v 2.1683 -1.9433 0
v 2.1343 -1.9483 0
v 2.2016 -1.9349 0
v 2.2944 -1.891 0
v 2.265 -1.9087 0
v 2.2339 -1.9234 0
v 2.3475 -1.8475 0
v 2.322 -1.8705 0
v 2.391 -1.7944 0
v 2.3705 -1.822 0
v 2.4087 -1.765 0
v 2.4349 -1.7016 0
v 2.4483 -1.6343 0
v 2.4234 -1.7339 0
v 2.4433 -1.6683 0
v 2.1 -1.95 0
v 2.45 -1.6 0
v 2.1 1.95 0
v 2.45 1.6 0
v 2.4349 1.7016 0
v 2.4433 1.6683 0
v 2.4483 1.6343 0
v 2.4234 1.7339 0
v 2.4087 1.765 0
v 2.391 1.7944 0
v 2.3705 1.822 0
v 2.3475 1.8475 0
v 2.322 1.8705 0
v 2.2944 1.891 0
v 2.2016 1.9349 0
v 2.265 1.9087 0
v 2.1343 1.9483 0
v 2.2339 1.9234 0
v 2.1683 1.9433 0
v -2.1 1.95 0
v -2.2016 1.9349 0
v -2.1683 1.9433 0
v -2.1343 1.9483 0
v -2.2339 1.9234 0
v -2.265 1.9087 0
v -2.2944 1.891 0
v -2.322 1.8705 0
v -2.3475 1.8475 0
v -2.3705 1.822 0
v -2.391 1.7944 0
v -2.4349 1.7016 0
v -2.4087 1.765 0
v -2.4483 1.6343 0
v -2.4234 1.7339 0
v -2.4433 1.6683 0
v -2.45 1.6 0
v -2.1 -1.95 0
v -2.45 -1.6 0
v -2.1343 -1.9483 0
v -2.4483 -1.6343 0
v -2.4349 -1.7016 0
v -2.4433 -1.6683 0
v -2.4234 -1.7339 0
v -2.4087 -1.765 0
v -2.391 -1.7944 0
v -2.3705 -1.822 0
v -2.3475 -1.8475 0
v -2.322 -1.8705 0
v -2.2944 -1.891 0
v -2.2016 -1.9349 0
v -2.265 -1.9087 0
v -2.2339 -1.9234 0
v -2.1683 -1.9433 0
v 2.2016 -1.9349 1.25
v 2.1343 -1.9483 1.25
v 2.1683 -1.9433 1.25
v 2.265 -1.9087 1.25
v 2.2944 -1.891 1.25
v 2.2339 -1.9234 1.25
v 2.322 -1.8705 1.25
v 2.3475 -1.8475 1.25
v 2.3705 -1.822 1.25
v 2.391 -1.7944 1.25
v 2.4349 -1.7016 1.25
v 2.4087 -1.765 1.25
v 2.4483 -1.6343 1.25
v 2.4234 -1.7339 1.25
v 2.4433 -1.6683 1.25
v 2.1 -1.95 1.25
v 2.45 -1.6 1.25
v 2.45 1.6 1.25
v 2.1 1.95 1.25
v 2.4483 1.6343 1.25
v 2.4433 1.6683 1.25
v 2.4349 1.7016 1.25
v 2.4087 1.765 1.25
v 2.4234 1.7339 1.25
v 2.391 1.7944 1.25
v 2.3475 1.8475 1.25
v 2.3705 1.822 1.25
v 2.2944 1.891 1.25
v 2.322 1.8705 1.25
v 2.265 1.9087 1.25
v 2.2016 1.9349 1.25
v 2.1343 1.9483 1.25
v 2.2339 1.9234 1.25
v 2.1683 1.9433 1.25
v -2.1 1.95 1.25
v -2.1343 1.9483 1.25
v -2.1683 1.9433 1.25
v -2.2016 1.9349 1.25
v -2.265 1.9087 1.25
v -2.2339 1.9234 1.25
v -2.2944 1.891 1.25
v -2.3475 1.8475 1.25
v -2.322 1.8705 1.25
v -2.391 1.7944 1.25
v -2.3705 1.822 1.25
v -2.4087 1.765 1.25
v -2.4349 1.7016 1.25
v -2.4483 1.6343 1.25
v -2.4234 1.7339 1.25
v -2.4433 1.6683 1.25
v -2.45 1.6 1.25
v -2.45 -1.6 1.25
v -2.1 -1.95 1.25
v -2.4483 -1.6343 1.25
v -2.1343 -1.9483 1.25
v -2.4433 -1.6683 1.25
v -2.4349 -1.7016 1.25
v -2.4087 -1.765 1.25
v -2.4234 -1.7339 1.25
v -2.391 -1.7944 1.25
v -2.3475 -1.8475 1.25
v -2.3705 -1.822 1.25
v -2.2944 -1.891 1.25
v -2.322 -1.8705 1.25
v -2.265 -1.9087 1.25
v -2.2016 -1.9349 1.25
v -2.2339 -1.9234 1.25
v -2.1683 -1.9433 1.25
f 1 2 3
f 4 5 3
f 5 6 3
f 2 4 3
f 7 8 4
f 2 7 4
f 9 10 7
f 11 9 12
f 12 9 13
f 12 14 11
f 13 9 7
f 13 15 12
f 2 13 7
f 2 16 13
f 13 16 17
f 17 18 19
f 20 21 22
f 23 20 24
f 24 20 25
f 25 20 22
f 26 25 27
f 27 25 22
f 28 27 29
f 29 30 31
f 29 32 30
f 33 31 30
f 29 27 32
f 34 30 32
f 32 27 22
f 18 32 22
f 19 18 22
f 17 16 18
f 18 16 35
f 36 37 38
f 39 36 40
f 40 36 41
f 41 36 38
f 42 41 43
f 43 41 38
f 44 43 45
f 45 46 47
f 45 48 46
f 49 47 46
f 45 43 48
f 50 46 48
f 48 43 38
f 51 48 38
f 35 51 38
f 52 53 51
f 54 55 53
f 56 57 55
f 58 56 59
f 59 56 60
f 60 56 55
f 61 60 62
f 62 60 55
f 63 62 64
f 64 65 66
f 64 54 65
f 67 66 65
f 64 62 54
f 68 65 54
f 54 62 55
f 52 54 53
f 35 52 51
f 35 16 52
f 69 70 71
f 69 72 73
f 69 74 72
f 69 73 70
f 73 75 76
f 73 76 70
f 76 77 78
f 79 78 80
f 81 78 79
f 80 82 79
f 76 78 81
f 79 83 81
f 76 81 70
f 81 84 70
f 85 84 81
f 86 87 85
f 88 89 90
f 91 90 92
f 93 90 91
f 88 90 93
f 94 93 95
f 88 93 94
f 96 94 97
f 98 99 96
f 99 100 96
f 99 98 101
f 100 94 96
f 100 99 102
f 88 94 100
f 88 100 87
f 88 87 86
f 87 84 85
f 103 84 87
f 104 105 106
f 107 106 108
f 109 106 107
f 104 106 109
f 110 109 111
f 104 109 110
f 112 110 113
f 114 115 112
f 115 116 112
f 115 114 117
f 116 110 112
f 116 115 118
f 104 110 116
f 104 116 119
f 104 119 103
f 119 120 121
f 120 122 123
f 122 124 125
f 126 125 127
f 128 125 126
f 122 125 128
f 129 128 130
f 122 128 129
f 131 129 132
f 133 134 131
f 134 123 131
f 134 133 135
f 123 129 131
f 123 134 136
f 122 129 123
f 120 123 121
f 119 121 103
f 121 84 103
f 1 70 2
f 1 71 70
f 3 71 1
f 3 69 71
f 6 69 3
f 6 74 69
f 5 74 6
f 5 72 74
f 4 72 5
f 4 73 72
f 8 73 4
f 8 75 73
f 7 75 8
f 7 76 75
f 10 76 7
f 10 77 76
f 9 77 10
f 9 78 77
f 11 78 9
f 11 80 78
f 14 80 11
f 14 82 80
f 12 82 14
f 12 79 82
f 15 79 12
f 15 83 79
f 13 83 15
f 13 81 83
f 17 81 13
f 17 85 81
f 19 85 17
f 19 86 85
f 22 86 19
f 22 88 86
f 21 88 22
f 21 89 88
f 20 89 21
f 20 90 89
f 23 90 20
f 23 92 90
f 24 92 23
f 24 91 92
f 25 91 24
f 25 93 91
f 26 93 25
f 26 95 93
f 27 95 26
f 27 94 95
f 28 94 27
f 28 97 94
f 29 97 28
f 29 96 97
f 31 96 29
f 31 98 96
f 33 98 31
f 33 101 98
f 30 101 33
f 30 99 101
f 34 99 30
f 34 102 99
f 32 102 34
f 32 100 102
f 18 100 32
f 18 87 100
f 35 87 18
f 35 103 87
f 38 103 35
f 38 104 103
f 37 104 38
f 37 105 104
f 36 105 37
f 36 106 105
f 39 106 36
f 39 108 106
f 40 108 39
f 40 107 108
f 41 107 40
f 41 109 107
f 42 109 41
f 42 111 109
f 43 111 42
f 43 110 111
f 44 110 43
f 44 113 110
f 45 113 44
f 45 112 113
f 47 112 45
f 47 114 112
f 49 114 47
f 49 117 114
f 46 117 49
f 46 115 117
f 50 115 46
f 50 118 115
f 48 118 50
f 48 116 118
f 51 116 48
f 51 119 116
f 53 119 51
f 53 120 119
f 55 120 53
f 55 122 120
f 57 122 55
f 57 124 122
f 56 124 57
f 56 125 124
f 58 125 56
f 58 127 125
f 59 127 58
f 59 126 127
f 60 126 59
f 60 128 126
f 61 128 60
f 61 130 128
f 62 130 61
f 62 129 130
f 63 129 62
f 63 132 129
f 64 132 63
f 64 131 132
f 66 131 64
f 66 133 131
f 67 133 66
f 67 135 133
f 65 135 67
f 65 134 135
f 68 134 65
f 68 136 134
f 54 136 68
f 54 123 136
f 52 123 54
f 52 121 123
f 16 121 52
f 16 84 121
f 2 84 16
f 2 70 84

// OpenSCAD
$fn = 64;

size = [4.90, 3.90, 1.25];

module smd_body(sz=[4.90,3.90,1.25], corner_r=0.35) {
    r = min(corner_r, sz[0]/2, sz[1]/2);
    linear_extrude(height=sz[2])
        offset(r=r)
            square([sz[0]-2*r, sz[1]-2*r], center=true);
}

smd_body(size);
